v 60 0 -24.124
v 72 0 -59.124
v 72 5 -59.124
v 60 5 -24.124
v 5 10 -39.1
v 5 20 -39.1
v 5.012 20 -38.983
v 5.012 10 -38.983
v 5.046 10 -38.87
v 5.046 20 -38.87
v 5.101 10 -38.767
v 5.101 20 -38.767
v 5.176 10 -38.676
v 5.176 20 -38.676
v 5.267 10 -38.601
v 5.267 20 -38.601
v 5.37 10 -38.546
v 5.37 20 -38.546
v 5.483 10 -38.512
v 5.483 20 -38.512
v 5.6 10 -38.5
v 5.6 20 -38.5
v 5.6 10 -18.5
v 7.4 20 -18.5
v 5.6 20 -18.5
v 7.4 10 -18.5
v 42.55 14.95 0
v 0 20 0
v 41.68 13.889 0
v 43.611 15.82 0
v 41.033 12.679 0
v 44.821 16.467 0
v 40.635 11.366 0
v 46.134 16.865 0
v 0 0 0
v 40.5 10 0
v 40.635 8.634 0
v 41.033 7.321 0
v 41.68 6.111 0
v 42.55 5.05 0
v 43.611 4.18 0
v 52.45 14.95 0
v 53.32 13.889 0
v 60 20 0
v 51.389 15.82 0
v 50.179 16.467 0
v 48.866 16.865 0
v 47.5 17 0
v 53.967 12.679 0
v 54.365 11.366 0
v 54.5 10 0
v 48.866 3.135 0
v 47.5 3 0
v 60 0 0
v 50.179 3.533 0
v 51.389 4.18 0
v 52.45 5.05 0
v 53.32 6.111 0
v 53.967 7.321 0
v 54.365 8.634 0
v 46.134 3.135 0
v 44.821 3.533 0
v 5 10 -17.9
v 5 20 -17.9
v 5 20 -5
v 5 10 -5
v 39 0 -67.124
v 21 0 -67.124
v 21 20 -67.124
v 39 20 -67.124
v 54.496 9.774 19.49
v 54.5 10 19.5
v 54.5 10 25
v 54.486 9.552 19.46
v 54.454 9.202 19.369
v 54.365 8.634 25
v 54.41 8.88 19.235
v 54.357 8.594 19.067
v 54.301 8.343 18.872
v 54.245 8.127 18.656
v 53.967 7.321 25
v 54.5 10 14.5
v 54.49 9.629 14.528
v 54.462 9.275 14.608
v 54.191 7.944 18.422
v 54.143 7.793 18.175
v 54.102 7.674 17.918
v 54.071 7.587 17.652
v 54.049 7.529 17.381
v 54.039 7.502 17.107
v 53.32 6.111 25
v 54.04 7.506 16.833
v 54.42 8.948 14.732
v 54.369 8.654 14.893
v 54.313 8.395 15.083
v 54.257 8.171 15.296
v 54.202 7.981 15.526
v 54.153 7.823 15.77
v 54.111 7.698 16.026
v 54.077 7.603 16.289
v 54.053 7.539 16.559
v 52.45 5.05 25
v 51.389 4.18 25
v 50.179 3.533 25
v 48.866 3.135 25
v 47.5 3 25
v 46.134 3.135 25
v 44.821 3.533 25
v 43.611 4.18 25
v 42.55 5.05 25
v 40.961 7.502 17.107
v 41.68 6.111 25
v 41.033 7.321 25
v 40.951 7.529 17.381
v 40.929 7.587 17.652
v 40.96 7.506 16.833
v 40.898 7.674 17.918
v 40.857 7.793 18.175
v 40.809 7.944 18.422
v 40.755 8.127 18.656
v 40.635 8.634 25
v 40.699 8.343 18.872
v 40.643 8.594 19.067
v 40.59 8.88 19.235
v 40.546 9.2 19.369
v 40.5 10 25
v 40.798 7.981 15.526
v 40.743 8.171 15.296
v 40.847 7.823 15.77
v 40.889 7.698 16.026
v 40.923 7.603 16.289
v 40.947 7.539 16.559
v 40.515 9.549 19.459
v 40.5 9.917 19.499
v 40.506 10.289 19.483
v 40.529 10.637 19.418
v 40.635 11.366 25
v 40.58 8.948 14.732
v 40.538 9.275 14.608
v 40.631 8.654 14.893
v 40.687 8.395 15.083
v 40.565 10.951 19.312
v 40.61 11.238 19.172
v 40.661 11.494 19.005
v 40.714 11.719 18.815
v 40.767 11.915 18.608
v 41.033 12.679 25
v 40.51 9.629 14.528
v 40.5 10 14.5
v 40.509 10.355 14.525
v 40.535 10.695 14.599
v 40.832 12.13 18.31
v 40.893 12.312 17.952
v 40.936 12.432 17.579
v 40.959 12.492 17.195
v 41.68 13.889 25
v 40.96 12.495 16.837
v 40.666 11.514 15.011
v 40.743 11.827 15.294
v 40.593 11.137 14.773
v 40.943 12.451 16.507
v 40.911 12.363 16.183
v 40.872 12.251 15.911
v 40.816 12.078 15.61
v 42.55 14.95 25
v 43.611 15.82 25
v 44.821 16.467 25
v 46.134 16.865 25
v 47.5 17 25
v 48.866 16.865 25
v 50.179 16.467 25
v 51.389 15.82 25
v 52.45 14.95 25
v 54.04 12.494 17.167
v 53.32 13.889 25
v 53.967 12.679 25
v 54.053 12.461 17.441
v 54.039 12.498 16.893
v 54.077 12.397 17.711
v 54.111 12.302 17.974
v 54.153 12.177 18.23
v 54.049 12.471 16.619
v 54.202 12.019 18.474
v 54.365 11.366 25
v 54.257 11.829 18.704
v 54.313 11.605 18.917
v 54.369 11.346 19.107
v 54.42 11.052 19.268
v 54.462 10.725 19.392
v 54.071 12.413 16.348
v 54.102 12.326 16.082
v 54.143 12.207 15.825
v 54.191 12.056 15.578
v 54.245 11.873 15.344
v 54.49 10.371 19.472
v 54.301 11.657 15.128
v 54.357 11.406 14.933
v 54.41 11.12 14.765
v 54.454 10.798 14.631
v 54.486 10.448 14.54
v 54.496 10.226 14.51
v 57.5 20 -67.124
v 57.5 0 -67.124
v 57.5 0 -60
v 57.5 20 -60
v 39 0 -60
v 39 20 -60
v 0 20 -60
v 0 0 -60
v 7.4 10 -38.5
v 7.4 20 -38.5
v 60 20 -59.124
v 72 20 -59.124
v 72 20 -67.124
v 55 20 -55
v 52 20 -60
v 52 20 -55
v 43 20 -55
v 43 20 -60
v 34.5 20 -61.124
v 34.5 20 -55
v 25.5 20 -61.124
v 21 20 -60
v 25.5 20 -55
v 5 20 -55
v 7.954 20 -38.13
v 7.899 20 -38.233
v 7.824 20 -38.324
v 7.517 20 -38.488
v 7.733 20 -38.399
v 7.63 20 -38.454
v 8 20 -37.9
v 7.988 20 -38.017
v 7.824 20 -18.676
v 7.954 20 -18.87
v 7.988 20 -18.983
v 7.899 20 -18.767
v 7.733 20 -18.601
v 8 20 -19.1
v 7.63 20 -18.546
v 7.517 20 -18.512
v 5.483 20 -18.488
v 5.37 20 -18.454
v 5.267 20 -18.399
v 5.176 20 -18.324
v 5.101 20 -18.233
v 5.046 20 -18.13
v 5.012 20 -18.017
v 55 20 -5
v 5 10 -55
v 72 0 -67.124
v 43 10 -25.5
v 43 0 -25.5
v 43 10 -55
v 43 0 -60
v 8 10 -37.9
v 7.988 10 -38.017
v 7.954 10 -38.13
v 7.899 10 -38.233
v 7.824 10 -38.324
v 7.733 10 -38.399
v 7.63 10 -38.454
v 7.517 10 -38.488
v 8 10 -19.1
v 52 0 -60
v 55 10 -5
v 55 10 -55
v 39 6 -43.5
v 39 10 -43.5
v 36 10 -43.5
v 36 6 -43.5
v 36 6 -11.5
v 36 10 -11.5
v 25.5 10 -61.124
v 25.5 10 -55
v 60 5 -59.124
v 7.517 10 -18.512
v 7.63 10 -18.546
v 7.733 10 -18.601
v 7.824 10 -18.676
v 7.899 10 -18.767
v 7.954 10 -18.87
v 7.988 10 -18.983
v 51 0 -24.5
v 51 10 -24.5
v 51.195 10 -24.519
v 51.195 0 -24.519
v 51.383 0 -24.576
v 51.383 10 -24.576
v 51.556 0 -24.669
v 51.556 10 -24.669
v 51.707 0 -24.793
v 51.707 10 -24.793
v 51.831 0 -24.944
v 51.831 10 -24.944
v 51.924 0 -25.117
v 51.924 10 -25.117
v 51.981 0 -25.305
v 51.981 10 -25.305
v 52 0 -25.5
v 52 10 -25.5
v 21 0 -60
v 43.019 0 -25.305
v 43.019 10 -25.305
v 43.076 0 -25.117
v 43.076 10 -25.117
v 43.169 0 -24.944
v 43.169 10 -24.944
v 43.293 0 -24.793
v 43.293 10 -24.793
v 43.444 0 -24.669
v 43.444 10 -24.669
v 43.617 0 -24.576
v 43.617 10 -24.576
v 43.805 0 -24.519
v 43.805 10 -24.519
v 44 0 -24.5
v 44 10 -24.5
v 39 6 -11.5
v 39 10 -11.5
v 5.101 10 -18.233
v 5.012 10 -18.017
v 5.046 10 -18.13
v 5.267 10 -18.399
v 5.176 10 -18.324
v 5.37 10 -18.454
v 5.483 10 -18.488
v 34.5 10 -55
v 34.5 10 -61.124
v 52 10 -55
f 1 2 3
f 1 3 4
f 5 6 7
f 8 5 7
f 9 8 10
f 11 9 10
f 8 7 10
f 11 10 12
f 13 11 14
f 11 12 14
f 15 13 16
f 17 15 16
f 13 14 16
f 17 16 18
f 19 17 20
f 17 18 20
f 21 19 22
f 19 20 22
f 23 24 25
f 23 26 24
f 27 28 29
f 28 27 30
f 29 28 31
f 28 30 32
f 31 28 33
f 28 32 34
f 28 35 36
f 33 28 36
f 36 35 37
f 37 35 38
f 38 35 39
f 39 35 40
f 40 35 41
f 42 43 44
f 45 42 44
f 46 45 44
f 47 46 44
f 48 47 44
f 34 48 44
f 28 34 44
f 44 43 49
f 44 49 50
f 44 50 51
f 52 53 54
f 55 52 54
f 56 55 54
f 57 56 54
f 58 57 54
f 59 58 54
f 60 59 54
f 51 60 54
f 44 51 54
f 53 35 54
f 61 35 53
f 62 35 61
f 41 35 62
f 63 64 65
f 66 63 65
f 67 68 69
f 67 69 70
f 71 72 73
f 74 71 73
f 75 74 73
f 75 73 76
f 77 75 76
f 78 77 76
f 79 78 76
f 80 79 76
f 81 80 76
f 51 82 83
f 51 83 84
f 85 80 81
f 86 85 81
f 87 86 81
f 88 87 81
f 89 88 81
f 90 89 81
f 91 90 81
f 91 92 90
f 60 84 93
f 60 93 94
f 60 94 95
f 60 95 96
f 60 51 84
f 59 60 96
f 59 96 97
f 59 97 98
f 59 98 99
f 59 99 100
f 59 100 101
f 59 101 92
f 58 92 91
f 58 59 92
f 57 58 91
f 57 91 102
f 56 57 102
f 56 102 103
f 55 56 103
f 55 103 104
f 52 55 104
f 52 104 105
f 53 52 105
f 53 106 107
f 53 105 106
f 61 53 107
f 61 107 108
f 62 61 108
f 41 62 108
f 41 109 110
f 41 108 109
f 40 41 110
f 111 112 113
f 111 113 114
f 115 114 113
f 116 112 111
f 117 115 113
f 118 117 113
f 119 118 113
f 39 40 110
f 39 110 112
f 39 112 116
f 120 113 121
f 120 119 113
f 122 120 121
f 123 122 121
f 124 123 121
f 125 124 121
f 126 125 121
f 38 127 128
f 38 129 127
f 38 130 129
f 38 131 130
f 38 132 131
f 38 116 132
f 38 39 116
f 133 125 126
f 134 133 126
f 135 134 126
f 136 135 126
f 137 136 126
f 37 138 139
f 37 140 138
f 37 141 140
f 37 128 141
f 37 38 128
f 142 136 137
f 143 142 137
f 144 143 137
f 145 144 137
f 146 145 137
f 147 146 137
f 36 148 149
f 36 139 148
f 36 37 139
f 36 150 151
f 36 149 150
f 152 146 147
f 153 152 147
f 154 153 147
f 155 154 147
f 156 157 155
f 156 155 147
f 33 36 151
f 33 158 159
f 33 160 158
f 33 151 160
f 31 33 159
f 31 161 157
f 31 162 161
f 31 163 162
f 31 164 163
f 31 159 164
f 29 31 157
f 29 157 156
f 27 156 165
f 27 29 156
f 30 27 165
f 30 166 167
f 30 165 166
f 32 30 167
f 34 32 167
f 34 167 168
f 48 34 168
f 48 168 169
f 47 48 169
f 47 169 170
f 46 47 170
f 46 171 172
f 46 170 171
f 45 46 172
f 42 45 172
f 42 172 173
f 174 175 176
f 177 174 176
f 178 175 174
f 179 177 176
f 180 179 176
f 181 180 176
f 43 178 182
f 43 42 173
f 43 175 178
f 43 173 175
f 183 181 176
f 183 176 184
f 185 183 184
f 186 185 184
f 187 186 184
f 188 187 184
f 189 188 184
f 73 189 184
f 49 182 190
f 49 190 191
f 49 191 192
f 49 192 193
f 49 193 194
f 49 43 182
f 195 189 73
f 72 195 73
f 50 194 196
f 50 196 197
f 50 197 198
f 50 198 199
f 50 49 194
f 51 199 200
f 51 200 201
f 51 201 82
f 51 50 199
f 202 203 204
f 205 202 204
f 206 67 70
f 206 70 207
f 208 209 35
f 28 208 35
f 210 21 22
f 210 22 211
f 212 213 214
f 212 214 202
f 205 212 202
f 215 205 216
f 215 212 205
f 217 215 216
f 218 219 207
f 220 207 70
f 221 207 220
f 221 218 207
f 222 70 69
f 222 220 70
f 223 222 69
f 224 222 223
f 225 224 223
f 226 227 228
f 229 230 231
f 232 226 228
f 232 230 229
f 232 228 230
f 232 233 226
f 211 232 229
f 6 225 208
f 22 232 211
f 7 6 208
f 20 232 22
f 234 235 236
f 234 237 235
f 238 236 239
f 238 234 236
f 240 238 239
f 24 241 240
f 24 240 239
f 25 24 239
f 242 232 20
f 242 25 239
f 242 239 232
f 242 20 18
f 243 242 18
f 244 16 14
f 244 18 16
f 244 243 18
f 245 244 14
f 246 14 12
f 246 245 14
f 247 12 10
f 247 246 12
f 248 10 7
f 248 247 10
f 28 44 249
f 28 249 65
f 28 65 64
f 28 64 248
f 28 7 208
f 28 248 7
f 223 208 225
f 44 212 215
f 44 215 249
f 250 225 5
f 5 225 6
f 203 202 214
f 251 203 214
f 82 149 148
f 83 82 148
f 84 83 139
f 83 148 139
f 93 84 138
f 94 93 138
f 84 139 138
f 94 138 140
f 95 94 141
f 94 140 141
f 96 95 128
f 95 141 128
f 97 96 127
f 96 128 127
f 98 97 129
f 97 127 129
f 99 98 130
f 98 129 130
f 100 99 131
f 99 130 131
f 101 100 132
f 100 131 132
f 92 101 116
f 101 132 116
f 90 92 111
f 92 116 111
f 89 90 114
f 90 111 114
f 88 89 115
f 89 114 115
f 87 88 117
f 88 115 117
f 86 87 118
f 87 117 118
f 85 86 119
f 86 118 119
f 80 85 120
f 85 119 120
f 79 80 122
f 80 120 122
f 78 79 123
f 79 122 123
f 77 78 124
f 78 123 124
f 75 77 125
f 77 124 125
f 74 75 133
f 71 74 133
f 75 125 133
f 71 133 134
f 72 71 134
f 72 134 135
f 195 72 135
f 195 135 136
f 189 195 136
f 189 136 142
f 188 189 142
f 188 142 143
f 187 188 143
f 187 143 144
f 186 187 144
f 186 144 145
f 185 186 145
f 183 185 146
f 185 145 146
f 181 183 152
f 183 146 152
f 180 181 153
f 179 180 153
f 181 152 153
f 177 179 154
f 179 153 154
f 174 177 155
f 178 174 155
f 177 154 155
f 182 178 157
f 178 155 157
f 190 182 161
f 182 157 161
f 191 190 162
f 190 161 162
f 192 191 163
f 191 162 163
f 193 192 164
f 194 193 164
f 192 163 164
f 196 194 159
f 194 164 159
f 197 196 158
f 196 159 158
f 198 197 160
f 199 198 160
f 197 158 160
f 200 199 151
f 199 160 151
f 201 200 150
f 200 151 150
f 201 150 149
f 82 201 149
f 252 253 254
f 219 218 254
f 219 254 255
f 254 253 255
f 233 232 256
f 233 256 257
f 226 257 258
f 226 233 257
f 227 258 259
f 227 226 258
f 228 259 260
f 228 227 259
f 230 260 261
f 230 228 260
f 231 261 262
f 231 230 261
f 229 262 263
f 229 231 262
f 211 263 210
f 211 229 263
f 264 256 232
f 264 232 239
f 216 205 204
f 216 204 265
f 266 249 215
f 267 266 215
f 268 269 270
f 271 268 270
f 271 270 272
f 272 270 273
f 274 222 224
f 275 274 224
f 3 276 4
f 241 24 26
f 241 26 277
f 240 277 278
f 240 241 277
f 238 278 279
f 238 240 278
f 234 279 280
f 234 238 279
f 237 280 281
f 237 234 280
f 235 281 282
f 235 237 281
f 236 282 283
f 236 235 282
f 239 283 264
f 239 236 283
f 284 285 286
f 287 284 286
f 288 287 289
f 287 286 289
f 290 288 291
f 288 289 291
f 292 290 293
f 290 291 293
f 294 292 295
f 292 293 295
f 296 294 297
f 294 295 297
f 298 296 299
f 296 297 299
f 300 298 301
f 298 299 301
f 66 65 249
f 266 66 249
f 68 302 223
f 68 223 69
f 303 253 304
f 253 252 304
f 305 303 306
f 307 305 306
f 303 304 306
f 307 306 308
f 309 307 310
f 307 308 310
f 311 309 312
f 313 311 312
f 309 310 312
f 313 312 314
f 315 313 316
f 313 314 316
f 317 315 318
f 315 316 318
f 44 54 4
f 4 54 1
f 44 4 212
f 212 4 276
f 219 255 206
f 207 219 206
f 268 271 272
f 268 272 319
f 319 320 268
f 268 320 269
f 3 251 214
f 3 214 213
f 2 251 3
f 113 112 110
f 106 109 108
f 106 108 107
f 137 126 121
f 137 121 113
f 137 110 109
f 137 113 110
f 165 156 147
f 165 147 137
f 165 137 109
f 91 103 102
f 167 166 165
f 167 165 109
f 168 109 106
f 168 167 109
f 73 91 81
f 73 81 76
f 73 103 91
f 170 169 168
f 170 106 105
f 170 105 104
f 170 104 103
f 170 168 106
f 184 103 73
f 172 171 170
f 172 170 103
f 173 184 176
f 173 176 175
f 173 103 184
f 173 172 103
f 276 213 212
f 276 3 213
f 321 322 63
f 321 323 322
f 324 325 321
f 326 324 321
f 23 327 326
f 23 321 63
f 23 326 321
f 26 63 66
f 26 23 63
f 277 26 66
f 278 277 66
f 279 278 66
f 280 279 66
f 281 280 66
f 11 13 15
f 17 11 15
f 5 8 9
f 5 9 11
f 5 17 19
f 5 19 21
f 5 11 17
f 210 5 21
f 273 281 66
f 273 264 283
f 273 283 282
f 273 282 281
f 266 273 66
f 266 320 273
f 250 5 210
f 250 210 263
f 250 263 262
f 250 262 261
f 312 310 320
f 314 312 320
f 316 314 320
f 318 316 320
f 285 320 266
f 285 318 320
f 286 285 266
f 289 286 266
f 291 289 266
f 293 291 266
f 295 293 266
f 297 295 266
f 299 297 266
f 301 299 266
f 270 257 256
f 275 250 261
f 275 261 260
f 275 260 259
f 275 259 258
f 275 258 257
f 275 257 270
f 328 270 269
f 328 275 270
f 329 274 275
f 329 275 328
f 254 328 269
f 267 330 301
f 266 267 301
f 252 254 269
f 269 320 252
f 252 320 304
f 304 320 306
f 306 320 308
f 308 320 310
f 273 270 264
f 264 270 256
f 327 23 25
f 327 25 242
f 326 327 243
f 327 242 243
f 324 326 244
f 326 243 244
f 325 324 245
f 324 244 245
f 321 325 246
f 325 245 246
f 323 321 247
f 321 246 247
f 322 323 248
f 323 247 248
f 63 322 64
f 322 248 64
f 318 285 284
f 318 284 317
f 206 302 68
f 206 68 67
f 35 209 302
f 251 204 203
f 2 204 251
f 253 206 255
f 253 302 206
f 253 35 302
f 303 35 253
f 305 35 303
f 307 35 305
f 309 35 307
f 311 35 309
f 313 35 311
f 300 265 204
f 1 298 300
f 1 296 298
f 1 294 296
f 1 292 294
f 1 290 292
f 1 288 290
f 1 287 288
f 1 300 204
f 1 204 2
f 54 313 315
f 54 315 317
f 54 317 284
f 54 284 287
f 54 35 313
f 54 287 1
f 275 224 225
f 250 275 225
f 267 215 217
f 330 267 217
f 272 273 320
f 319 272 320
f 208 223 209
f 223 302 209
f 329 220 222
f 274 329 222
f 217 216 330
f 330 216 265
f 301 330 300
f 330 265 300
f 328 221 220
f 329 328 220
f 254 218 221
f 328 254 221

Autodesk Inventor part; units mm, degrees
ref_plane "XZ Plane" through (0, 0, 0) normal (0, 1, 0) x (-1, 0, 0)
ref_plane "XY Plane" through (0, 0, 0) normal (0, 0, 1) x (1, 0, 0)
sketch "Sketch1" plane through (0, 0, 0) normal (0, 1, 0) x (-1, 0, 0)
  line L0 (0, 0) -> (0, -60)
  line L1 (0, 0) -> (-50, 0)
  line L2 (-5, -60) -> (-5, -5)
  line L3 (-5, -5) -> (-50, -5)
  line L4 (-47.5, 69.0442) -> (-47.5, -71.5611) construction
  line L5 (-50, 0) -> (-55, 0)
  line L6 (-55, 0) -> (-55, -50)
  line L7 (-55, -50) -> (-75, -50)
  line L8 (-75, -50) -> (-75, -60)
  line L9 (-75, -60) -> (-45, -60)
  line L10 (-5, -60) -> (-21, -60)
  circle A0 centre (-47.5, -73.124) radius 8.5
  line L11 (16.7028, -43.5) -> (-102.7124, -43.5) construction
  line L12 (-45, -26.5) -> (-50, -26.5)
  line L13 (-50, -26.5) -> (-50, -60.5)
  line L14 (-50, -60.5) -> (-45, -60.5)
  line L15 (-45, -60.5) -> (-45, -26.5)
  line L16 (-45, -43.5) -> (-50, -43.5) construction
  line L17 (-21, -60) -> (-21, -67.124)
  line L18 (-21, -67.124) -> (-30, -67.124)
  line L19 (-39, -67.124) -> (-39, -60)
  line L20 (-39, -60) -> (-45, -60) construction
  line L21 (-15.952, -100.4576) -> (-35.952, -100.4576)
  line L22 (-35.952, -108.4576) -> (-15.952, -108.4576)
  line L23 (-15.952, -108.4576) -> (-15.952, -100.4576)
  line L24 (-15.952, -73.124) -> (-76.4965, -73.124) construction
  line L25 (-30, -57.9879) -> (-30, -83.8601) construction
  line L26 (-25.952, -100.4576) -> (-25.952, -108.4576) construction
  line L27 (-45, -31) -> (-50, -31) construction
  line L28 (-50, -31) -> (-50, -56)
  line L29 (-50, -56) -> (-45, -56) construction
  line L30 (-45, -56) -> (-45, -31)
  line L31 (-45, -56) -> (-50, -56)
  line L32 (-45, -65.1391) -> (-45, -56)
  line L33 (-45, -56) -> (-50, -56)
  line L34 (-50, -56) -> (-50, -65)
  line L35 (-50, -65) -> (-45, -65)
  line L36 (-45, -65) -> (-45, -56)
  arc A1 (-35.952, -108.4576) -> (-35.952, -100.4576) centre (-43.452, -104.4576) ccw
  line L37 (-30, -67.124) -> (-39, -67.124)
  point P0 (-47.5, -43.5)
  point P1 (-30, -73.124)
  dimension "d9" = 17
  dimension "d0" = 60
  dimension "d1" = 50
  dimension "d2" = 5
  dimension "d3" = 47.5
  dimension "d4" = 5
  dimension "d5" = 50
  dimension "d6" = 20
  dimension "d7" = 30
  dimension "d10" = 38.5
  dimension "d11" = 5
  dimension "d12" = 34
  dimension "d13" = 20
  dimension "d14" = 8
  dimension "d57" = 25
  dimension "d58" = 4.5
  dimension "d59" = 5
  dimension "d60" = 9
  dimension "d61" = 17
  dimension "d62" = 9
  dimension "d63" = 9
  dimension "d64" = 9
  dimension "d65" = 6
sketch "Sketch2" plane through (0, 0, 0) normal (0, 1, 0) x (-1, 0, 0)
  line L0 (0, 0) -> (-60, 0)
  line L1 (-60, 0) -> (-60, -55)
  line L2 (-57.5, -60) -> (0, -60)
  line L3 (0, -60) -> (0, 0)
  line L4 (-5, -60) -> (-21, -60) projected
  line L5 (-30, -67.124) -> (-39, -67.124) projected
  line L6 (-57.5, -67.124) -> (-72, -67.124)
  line L7 (-72, -67.124) -> (-72, -59.124)
  line L8 (-72, -59.124) -> (-60, -59.124)
  line L9 (-60, -59.124) -> (-60, 0)
  line L10 (-57.5, -67.124) -> (-57.5, -60)
  point P0 (-60, -67.124)
  dimension "d16" = 57.5
  dimension "d73" = 8
  dimension "d76" = 12
  dimension "d77" = 60
extrude "Extrusion1" add sketch "Sketch2" along normal blind 20
sketch "Sketch3" plane through (0, 20, 0) normal (0, 1, 0) x (1, 0, 0)
  line L0 (5, 5) -> (55, 5)
  line L1 (55, 5) -> (55, 55)
  line L2 (55, 55) -> (5, 55)
  line L3 (5, 55) -> (5, 5)
  line L4 (0, 0) -> (60, 0) projected
  line L5 (0, 60) -> (0, 0) projected
  dimension "d23" = 5
  dimension "d24" = 5
  dimension "d25" = 50
  dimension "d26" = 50
extrude "Extrusion2" cut sketch "Sketch3" against normal blind 10
sketch "Sketch5" plane through (0, 0, 0) normal (0, -1, 0) x (1, 0, 0)
  line L0 (57.5, -60) -> (0, -60) projected
  line L1 (45, -60.5) -> (45, -26.5) projected
  line L2 (5, -60) -> (5, -5) projected
  line L3 (50, -26.5) -> (50, -60.5) projected
  line L4 (45, -26.5) -> (50, -26.5) projected
  line L5 (50, -60.5) -> (45, -60.5) projected
  line L6 (52, -60) -> (52, -24.5)
  line L7 (52, -24.5) -> (43, -24.5)
  line L8 (43, -24.5) -> (43, -60)
  line L9 (52, -60.5) -> (52, -60)
  line L10 (52, -60) -> (43, -60)
  point P0 (80, -60)
  dimension "d30" = 40
  dimension "d31" = 2
extrude "Extrusion3" cut sketch "Sketch5" against normal through all contours L0 L3 L4 L1 L8 L7 L6 | L0 L1 L4 L3
sketch "Sketch6" plane through (0, 0, 0) normal (0, 0, 1) x (1, 0, 0)
  line L0 (0, 20) -> (60, 20) projected
  line L1 (47.5, 0) -> (47.5, 20) construction
  circle A0 centre (47.5, 10) radius 7
  point P0 (47.5, 0)
  dimension "d34" = 14
extrude "Extrusion4" add sketch "Sketch6" along normal blind 25
ref_plane "Work Plane1" through (54.5, 10, 0) normal (1, 0, 0) x (0, 1, 0)
sketch "Sketch7" plane through (54.5, 10, 0) normal (1, 0, 0) x (0, 1, 0)
  line L0 (7, 25) -> (-7, 25) projected
  line L1 (0, 25) -> (0, 0) construction
  point P0 (-10, 0)
  point P1 (0, 17)
  dimension "d37" = 8
hole "Hole1" at (54.5, 10, 17) direction (-1, 0, 0) diameter 5 end through all
sketch "Sketch8" plane through (0, 10, 0) normal (0, 1, 0) x (1, 0, 0)
  line L0 (36, 11.5) -> (39, 11.5)
  line L1 (39, 11.5) -> (39, 43.5)
  line L2 (39, 43.5) -> (36, 43.5)
  line L3 (36, 43.5) -> (36, 11.5)
  line L4 (45, 60.5) -> (45, 26.5) projected
  line L5 (-16.7028, 43.5) -> (102.7124, 43.5) construction
  point P0 (0, 0)
  point P1 (47.5, 43.5)
  dimension "d45" = 6
  dimension "d46" = 32
  dimension "d47" = 3
extrude "Extrusion5" cut sketch "Sketch8" against normal blind 4
sketch "Sketch9" plane through (0, 10, 0) normal (0, 1, 0) x (1, 0, 0)
  line L0 (36, 43.5) -> (39, 43.5) projected
  line L1 (5, 5) -> (5, 55) projected
  line L2 (8, 18.5) -> (5, 18.5)
  line L3 (5, 18.5) -> (5, 38.5)
  line L4 (5, 38.5) -> (8, 38.5)
  line L5 (8, 38.5) -> (8, 18.5)
  point P0 (0, 0)
  dimension "d50" = 3
  dimension "d51" = 5
  dimension "d52" = 20
extrude "Extrusion6" add sketch "Sketch9" along normal up to surface (10 mm away)
fillet "Fillet1" radius 0.6 4 edges at (5, 15, -38.5) (8, 15, -38.5) (8, 15, -18.5) (5, 15, -18.5)
fillet "Fillet2" radius 1 2 edges at (43, 5, -24.5) (52, 5, -24.5)
sketch "Sketch10" plane through (0, 0, 0) normal (0, -1, 0) x (1, 0, 0)
  line L0 (43, -60) -> (0, -60) projected
  line L1 (39, -67.124) -> (39, -60) projected
  line L2 (30, -67.124) -> (39, -67.124) projected
  line L3 (21, -60) -> (21, -67.124) projected
  line L4 (21, -67.124) -> (30, -67.124) projected
  line L5 (39, -60) -> (39, -67.124)
  line L6 (21, -67.124) -> (39, -67.124)
  line L7 (21, -67.124) -> (21, -60)
  point P0 (80, -60)
extrude "Extrusion7" add sketch "Sketch10" against normal up to surface (20 mm away)
sketch "Sketch11" plane through (0, 20, 0) normal (0, 1, 0) x (1, 0, 0)
  line L0 (39, 67.124) -> (39, 60) projected
  line L1 (21, 67.124) -> (39, 67.124) projected
  line L2 (21, 60) -> (21, 67.124) projected
  line L3 (5, 55) -> (55, 55) projected
  line L4 (25.5, 55) -> (34.5, 55)
  line L5 (34.5, 55) -> (34.5, 61.124)
  line L6 (34.5, 61.124) -> (25.5, 61.124)
  line L7 (25.5, 61.124) -> (25.5, 55)
  dimension "d68" = 6
  dimension "d69" = 4.5
  dimension "d70" = 4.5
extrude "Extrusion8" cut sketch "Sketch11" against normal up to surface (10 mm away)
sketch "Sketch12" plane through (0, 20, 0) normal (0, 1, 0) x (1, 0, 0)
  line L0 (34.5, 61.124) -> (34.5, 55) projected
  line L1 (34.5, 55) -> (43, 55) projected
  line L2 (43, 55) -> (43, 60) projected
  line L3 (43, 60) -> (39, 60) projected
  line L4 (39, 67.124) -> (39, 60) projected
  line L5 (21, 67.124) -> (39, 67.124) projected
  line L6 (21, 60) -> (21, 67.124) projected
  line L7 (21, 60) -> (0, 60) projected
  line L8 (0, 60) -> (0, 0) projected
  line L9 (0, 0) -> (60, 0) projected
  line L10 (60, 0) -> (60, 59.124) projected
  line L11 (60, 59.124) -> (72, 59.124) projected
  line L12 (72, 59.124) -> (72, 67.124) projected
  line L13 (72, 67.124) -> (57.5, 67.124) projected
  line L14 (57.5, 67.124) -> (57.5, 60) projected
  line L15 (57.5, 60) -> (52, 60) projected
  line L16 (52, 60) -> (52, 55) projected
  line L17 (52, 55) -> (55, 55) projected
  line L18 (55, 55) -> (55, 5) projected
  line L19 (55, 5) -> (5, 5) projected
  line L20 (5, 5) -> (5, 17.9) projected
  arc A0 (5.6, 18.5) -> (5, 17.9) centre (5.6, 17.9) ccw projected
  line L21 (7.4, 18.5) -> (5.6, 18.5) projected
  arc A1 (7.4, 18.5) -> (8, 19.1) centre (7.4, 19.1) ccw projected
  line L22 (8, 37.9) -> (8, 19.1) projected
  arc A2 (8, 37.9) -> (7.4, 38.5) centre (7.4, 37.9) ccw projected
  line L23 (5.6, 38.5) -> (7.4, 38.5) projected
  arc A3 (5, 39.1) -> (5.6, 38.5) centre (5.6, 39.1) ccw projected
  line L24 (5, 39.1) -> (5, 55) projected
  line L25 (5, 55) -> (25.5, 55) projected
  line L26 (25.5, 55) -> (25.5, 61.124) projected
  line L27 (25.5, 61.124) -> (34.5, 61.124) projected
  line L28 (65, 73.0401) -> (65, 59.124)
  circle A4 centre (47.5, 73.124) radius 8.5 projected
  point P0 (60, 52.124)
  point P1 (60, 57.124)
  point P2 (62, 59.124)
  dimension "d74" = 9
sketch "Sketch13" plane through (0, 0, 0) normal (0, -1, 0) x (1, 0, 0)
  line L0 (60, 0) -> (60, -59.124) projected
  line L1 (72, -59.124) -> (60, -24.124)
  line L2 (60, 0) -> (60, -59.124) projected
  line L3 (60, -59.124) -> (60, -24.124)
  line L4 (72, -59.124) -> (60, -59.124)
  dimension "d78" = 35
extrude "Extrusion9" add sketch "Sketch13" against normal blind 5
equation "\"d70\" = d69"
properties part number "Housing"
